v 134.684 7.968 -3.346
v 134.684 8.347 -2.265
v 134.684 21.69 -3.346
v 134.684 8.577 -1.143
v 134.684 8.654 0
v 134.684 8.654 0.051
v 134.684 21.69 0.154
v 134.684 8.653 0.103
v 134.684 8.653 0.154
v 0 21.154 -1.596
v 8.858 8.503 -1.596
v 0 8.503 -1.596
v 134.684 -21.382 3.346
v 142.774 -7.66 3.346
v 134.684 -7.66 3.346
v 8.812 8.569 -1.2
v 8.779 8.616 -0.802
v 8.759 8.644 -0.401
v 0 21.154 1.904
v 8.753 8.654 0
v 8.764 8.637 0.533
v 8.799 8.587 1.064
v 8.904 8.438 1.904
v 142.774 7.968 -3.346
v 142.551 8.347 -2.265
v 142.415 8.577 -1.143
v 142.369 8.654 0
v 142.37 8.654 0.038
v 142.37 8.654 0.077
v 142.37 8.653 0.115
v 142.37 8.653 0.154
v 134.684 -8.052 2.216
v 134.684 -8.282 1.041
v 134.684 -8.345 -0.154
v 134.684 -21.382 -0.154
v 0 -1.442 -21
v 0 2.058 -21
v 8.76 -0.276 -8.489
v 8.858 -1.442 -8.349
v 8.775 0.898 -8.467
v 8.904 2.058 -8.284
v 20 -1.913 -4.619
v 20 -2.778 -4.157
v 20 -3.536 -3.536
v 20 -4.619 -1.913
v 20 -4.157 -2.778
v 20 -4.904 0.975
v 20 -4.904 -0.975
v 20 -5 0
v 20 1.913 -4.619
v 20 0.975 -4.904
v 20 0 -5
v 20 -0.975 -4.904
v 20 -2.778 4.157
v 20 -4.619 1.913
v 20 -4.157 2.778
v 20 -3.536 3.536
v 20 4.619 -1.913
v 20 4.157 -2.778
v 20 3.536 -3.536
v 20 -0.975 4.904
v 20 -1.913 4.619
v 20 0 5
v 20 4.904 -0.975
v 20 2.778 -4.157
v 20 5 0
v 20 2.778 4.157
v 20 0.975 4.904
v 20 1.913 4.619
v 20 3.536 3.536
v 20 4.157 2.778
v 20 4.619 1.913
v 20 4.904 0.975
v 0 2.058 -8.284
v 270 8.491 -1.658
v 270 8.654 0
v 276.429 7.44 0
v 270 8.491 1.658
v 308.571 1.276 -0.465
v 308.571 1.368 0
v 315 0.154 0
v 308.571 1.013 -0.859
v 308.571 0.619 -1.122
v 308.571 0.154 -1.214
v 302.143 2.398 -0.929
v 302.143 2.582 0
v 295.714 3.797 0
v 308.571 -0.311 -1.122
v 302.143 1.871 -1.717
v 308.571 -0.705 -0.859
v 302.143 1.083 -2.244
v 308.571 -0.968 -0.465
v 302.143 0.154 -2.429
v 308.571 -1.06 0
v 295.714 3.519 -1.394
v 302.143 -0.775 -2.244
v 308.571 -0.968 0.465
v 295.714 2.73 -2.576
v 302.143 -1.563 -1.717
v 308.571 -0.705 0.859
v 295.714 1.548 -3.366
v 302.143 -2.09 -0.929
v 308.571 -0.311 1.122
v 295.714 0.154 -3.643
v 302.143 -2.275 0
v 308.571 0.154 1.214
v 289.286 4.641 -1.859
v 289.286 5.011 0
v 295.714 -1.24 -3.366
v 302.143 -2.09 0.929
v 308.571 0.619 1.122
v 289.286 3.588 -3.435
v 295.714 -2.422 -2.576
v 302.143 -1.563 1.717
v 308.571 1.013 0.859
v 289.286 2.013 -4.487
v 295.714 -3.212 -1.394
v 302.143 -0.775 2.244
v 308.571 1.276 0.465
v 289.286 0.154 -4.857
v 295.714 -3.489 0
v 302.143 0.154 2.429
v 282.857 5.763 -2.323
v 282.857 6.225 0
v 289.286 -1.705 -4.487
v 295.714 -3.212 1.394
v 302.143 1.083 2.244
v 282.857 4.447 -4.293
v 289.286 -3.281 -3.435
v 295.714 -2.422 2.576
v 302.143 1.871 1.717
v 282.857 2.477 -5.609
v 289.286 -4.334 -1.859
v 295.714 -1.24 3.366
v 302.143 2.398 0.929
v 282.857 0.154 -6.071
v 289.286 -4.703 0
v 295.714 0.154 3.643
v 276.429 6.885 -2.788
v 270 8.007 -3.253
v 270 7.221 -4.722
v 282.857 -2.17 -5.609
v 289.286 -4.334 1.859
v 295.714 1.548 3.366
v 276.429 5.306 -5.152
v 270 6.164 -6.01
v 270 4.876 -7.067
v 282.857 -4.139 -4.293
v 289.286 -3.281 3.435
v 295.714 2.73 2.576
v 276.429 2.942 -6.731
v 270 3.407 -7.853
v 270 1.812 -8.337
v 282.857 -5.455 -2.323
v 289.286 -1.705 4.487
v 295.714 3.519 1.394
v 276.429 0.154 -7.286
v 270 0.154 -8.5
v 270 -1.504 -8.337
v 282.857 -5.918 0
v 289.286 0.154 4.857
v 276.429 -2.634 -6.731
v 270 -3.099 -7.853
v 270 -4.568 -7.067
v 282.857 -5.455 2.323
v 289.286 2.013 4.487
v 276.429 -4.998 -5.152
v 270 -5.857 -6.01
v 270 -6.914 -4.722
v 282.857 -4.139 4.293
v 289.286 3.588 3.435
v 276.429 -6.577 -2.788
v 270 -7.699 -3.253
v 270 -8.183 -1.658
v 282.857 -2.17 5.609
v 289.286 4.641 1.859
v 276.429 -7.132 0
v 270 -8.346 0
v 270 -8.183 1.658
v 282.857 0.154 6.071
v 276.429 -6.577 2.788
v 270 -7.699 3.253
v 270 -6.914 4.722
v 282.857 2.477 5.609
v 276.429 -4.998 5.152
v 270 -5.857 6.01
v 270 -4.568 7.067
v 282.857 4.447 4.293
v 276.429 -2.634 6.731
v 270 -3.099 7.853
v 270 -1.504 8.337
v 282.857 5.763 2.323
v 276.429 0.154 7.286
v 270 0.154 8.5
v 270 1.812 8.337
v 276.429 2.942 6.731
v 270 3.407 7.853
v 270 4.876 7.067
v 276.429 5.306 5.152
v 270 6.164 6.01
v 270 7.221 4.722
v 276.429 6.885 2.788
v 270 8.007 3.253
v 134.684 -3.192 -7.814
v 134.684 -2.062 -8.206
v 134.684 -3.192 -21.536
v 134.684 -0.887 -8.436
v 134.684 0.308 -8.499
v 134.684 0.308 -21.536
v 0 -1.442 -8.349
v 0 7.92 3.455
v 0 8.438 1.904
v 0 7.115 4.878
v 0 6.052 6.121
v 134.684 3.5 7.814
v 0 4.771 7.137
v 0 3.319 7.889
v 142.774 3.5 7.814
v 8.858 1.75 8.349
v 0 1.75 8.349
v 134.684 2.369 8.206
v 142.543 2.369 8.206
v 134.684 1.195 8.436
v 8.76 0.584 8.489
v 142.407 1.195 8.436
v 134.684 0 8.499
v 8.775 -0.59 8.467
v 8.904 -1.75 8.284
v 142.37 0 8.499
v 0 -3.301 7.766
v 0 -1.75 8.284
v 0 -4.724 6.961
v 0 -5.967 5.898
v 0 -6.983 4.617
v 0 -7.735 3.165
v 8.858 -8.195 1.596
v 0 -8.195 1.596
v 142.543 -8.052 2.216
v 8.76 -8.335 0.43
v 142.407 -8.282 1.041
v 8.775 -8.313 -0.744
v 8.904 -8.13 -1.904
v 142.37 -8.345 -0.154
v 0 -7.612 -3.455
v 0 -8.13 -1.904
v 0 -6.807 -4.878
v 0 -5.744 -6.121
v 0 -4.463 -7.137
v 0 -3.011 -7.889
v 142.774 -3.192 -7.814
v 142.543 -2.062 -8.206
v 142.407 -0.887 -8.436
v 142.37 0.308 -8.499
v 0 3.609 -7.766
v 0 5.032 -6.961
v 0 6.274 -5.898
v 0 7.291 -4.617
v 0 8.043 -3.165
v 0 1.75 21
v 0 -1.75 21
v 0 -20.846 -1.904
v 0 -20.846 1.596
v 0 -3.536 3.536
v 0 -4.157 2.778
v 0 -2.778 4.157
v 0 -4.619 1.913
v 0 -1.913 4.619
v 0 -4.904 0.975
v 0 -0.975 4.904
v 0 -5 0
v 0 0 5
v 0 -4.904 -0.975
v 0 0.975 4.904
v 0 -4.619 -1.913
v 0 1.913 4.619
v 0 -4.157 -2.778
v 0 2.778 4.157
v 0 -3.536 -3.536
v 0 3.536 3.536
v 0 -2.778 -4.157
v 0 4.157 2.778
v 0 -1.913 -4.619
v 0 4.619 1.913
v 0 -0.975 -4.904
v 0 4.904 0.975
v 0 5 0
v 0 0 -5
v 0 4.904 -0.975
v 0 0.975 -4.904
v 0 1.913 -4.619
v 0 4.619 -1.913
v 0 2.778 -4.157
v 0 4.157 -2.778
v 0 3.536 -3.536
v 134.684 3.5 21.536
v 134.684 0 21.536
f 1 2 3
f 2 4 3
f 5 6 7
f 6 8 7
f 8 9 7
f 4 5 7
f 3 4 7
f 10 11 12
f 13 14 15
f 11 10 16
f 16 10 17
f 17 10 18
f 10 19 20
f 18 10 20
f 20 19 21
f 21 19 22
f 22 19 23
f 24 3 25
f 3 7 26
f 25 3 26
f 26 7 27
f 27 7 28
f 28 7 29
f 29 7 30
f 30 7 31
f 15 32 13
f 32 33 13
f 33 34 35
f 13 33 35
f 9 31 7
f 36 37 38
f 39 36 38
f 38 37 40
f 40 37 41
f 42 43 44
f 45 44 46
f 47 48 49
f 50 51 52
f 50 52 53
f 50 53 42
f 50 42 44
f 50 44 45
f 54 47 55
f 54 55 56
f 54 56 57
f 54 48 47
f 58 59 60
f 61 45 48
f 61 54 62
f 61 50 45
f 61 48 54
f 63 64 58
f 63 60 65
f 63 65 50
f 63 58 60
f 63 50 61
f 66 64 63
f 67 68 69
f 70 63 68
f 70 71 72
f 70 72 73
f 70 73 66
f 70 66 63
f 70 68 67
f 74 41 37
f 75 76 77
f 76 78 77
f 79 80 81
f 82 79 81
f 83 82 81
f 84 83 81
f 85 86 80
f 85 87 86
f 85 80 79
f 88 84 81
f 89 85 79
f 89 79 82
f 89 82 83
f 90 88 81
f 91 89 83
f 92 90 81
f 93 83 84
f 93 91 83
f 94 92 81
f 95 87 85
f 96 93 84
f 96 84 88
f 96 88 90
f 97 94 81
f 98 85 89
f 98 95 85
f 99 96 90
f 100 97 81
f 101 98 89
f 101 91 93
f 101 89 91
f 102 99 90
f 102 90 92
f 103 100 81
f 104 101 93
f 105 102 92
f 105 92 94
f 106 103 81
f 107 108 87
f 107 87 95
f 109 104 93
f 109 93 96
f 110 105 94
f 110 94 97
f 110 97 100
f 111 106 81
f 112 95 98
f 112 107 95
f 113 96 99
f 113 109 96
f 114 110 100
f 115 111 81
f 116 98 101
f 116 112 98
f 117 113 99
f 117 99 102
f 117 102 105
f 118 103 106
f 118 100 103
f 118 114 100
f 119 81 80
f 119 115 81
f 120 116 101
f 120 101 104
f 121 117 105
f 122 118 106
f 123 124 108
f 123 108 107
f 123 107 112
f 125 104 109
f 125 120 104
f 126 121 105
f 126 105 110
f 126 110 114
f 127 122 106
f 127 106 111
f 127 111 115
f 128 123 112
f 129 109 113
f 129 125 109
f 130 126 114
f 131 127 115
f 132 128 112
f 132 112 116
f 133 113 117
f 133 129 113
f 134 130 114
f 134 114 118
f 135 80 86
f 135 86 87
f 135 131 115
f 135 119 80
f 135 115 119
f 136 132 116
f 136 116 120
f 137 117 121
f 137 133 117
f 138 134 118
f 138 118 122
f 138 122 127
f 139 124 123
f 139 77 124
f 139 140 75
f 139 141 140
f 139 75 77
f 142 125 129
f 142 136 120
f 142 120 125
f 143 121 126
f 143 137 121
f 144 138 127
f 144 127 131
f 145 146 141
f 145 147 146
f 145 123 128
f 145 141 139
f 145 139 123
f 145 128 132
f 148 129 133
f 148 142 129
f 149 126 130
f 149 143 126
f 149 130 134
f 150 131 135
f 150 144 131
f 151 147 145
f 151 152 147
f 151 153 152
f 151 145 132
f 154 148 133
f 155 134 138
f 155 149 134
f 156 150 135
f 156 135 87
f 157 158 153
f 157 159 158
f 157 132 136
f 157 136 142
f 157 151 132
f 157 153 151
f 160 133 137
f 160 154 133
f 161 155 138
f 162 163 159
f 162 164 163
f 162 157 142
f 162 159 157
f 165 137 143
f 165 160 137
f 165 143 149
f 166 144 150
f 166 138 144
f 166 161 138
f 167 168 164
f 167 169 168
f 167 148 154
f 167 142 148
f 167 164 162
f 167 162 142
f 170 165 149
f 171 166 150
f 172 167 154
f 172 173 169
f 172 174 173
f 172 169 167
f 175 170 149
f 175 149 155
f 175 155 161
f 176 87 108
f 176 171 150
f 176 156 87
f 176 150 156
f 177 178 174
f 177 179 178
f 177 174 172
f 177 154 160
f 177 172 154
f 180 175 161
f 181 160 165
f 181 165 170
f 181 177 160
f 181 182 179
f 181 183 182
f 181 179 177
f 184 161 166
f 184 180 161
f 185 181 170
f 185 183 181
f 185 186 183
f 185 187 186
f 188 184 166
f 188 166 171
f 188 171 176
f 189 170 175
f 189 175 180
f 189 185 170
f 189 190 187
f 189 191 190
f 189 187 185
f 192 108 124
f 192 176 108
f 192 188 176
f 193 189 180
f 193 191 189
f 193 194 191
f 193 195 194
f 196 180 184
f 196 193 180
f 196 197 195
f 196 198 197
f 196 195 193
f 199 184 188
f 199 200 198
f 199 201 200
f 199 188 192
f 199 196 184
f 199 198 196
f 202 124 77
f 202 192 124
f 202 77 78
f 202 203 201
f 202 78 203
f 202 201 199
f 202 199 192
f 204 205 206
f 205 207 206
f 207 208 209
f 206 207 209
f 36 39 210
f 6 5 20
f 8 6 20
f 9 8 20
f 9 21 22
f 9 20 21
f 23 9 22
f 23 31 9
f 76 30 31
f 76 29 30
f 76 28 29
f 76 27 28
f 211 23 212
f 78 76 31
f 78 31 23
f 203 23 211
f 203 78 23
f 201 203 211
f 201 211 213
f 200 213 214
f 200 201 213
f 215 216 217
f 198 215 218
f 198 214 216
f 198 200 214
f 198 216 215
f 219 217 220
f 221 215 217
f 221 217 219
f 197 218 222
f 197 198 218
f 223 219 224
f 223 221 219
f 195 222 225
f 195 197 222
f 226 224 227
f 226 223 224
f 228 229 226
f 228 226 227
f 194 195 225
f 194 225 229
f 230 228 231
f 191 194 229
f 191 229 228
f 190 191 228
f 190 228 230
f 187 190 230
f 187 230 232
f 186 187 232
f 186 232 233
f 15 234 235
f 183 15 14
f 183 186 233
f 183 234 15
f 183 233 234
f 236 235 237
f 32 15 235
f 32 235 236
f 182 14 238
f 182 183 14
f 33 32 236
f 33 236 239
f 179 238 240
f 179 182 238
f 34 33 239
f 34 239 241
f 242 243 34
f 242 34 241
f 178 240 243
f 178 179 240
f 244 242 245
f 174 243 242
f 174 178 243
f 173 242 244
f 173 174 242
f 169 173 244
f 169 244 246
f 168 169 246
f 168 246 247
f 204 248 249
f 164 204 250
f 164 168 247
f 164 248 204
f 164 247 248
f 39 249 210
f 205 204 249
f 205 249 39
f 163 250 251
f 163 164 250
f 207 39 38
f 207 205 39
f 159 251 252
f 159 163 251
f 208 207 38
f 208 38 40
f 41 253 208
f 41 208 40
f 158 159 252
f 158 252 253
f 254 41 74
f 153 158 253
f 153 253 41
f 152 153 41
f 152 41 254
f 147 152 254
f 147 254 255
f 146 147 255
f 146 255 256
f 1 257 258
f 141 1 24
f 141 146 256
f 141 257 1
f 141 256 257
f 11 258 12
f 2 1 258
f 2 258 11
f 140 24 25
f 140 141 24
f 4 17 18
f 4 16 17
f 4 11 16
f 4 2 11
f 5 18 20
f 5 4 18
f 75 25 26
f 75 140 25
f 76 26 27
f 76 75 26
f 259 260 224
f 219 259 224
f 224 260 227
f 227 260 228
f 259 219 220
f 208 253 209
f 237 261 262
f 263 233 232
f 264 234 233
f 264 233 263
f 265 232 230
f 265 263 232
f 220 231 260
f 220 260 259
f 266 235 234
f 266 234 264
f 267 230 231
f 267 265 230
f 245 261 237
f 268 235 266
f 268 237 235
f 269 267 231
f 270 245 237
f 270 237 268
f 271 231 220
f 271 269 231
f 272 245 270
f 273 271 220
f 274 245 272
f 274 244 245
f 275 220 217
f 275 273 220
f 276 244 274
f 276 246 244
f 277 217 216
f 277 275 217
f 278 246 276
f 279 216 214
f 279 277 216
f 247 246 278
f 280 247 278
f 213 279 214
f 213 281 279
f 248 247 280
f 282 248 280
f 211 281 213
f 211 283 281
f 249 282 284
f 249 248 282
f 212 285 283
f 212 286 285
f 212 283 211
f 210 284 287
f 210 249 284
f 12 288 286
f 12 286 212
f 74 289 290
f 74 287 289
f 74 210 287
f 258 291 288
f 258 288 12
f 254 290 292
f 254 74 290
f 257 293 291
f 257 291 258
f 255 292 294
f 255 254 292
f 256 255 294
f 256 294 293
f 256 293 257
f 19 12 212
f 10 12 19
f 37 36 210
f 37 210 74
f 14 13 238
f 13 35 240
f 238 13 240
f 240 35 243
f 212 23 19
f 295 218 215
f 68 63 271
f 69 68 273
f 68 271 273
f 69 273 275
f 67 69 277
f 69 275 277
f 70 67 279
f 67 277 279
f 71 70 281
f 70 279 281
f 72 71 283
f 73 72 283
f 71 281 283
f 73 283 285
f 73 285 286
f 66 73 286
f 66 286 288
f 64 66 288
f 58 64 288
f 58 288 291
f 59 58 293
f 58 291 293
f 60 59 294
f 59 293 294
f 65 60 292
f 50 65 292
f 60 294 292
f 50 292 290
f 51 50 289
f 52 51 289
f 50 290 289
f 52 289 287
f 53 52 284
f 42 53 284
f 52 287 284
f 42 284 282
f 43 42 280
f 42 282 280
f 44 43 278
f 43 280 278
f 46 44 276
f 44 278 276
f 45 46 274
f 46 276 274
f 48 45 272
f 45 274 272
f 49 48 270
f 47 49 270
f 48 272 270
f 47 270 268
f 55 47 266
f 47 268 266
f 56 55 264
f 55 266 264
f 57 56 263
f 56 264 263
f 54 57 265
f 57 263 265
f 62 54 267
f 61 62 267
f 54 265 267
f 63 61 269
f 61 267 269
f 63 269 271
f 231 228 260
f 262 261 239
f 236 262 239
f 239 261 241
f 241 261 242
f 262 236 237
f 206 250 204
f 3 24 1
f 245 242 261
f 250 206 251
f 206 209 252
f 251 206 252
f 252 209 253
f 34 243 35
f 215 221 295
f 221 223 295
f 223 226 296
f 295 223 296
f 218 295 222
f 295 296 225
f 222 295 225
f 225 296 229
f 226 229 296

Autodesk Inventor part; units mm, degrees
ref_plane "YZ Plane" through (0, 0, 0) normal (1, 0, 0) x (0, 1, 0)
ref_plane "XZ Plane" through (0, 0, 0) normal (0, 1, 0) x (-1, 0, 0)
ref_plane "XY Plane" through (0, 0, 0) normal (0, 0, 1) x (1, 0, 0)
sketch "Esboço1" plane through (0, 0, 0) normal (0, 0, 1) x (1, 0, 0)
  line L0 (0, 8.6539) -> (150, 8.6539)
  line L1 (0, 8.6539) -> (0, 0.1539)
  line L2 (150, 8.6539) -> (150, 0.1539)
  line L3 (150, 0.1539) -> (150, 16.6456)
  line L4 (150, 8.6539) -> (270, 8.6539)
  line L5 (270, 8.6539) -> (285, 4.4039)
  line L6 (270, 0.1539) -> (285, 4.4039)
  line L7 (270, 0.1539) -> (0, 0.1539)
  line L8 (270, 8.6539) -> (270, 0.1539)
  dimension "d13" = 150
  dimension "d15" = 120
  dimension "d17" = 17
revolve "Revolução1" add sketch "Esboço1" angle 360 about axis through (270, 0.1539, 0) along (-1, 0, 0) contours L0 L2 L7 L1 | L4 L8 L7 L2
sketch "Esboço2" plane through (0, 0, 0) normal (0, 0, 1) x (1, 0, 0)
  line L0 (285, 0.1539) -> (315, 0.1539)
  line L1 (270, 8.6539) -> (270, -8.3461) projected
  line L2 (270, 0.1539) -> (285, 0.1539)
  line L3 (270, 8.6539) -> (270, 0.1539)
  line L4 (315, 0.1539) -> (270, 8.6539)
  point P0 (0, 0)
revolve "Revolução2" add sketch "Esboço2" angle 360 about axis through (285, 0.1539, 0) along (1, 0, 0)
sketch "Esboço3" plane through (0, 0, 0) normal (0, 1, 0) x (-1, 0, 0)
  line L0 (0, 0) -> (-25, 0)
  line L1 (0, -8.5) -> (0, 8.5) projected
  line L2 (0, 0) -> (-50, 0)
  line L3 (-50, 0) -> (-25, 0)
  line L4 (-50, 0) -> (-25, 0)
  line L5 (0, 0) -> (0, 21)
  line L6 (0, 21) -> (-14.7044, 0)
  line L7 (0, 21) -> (26.0415, 21) construction
  dimension "d54" = 21
  dimension "d57" = 125
sketch "Esboço4" plane through (0, 0, 0) normal (0, 1, 0) x (-1, 0, 0)
  line L0 (-270, -8.5) -> (-270, 8.5) projected
  line L1 (-134.6841, 0) -> (-134.6841, 21.5359)
  line L2 (-134.6841, 21.5359) -> (-147.3807, 0)
  line L3 (-134.6841, 0) -> (-147.3807, 0)
  point P0 (0, 0)
  dimension "d43" = 25
  dimension "d44" = 21.5359
extrude "Extrusão3" add sketch "Esboço4" along normal blind 3.5
pattern_circular "Padrão circular2" count 4 over 360 about axis through (135, 0.1539, 0) along (-1, 0, 0) of "Extrusão3"
sketch "Esboço5" plane through (0, 0.1539, 0) normal (-1, 0, 0) x (0, 0, 1)
  circle A0 centre (0, -0.1539) radius 5
  dimension "d50" = 10
extrude "Extrusão5" add sketch "Esboço3" along normal mid plane 3.5
pattern_circular "Padrão circular3" count 4 over 360 about axis through (135, 0.1539, 0) along (-1, 0, 0) of "Extrusão5"
extrude "Extrusão6" cut sketch "Esboço5" against normal blind 20
properties part number "120c"
